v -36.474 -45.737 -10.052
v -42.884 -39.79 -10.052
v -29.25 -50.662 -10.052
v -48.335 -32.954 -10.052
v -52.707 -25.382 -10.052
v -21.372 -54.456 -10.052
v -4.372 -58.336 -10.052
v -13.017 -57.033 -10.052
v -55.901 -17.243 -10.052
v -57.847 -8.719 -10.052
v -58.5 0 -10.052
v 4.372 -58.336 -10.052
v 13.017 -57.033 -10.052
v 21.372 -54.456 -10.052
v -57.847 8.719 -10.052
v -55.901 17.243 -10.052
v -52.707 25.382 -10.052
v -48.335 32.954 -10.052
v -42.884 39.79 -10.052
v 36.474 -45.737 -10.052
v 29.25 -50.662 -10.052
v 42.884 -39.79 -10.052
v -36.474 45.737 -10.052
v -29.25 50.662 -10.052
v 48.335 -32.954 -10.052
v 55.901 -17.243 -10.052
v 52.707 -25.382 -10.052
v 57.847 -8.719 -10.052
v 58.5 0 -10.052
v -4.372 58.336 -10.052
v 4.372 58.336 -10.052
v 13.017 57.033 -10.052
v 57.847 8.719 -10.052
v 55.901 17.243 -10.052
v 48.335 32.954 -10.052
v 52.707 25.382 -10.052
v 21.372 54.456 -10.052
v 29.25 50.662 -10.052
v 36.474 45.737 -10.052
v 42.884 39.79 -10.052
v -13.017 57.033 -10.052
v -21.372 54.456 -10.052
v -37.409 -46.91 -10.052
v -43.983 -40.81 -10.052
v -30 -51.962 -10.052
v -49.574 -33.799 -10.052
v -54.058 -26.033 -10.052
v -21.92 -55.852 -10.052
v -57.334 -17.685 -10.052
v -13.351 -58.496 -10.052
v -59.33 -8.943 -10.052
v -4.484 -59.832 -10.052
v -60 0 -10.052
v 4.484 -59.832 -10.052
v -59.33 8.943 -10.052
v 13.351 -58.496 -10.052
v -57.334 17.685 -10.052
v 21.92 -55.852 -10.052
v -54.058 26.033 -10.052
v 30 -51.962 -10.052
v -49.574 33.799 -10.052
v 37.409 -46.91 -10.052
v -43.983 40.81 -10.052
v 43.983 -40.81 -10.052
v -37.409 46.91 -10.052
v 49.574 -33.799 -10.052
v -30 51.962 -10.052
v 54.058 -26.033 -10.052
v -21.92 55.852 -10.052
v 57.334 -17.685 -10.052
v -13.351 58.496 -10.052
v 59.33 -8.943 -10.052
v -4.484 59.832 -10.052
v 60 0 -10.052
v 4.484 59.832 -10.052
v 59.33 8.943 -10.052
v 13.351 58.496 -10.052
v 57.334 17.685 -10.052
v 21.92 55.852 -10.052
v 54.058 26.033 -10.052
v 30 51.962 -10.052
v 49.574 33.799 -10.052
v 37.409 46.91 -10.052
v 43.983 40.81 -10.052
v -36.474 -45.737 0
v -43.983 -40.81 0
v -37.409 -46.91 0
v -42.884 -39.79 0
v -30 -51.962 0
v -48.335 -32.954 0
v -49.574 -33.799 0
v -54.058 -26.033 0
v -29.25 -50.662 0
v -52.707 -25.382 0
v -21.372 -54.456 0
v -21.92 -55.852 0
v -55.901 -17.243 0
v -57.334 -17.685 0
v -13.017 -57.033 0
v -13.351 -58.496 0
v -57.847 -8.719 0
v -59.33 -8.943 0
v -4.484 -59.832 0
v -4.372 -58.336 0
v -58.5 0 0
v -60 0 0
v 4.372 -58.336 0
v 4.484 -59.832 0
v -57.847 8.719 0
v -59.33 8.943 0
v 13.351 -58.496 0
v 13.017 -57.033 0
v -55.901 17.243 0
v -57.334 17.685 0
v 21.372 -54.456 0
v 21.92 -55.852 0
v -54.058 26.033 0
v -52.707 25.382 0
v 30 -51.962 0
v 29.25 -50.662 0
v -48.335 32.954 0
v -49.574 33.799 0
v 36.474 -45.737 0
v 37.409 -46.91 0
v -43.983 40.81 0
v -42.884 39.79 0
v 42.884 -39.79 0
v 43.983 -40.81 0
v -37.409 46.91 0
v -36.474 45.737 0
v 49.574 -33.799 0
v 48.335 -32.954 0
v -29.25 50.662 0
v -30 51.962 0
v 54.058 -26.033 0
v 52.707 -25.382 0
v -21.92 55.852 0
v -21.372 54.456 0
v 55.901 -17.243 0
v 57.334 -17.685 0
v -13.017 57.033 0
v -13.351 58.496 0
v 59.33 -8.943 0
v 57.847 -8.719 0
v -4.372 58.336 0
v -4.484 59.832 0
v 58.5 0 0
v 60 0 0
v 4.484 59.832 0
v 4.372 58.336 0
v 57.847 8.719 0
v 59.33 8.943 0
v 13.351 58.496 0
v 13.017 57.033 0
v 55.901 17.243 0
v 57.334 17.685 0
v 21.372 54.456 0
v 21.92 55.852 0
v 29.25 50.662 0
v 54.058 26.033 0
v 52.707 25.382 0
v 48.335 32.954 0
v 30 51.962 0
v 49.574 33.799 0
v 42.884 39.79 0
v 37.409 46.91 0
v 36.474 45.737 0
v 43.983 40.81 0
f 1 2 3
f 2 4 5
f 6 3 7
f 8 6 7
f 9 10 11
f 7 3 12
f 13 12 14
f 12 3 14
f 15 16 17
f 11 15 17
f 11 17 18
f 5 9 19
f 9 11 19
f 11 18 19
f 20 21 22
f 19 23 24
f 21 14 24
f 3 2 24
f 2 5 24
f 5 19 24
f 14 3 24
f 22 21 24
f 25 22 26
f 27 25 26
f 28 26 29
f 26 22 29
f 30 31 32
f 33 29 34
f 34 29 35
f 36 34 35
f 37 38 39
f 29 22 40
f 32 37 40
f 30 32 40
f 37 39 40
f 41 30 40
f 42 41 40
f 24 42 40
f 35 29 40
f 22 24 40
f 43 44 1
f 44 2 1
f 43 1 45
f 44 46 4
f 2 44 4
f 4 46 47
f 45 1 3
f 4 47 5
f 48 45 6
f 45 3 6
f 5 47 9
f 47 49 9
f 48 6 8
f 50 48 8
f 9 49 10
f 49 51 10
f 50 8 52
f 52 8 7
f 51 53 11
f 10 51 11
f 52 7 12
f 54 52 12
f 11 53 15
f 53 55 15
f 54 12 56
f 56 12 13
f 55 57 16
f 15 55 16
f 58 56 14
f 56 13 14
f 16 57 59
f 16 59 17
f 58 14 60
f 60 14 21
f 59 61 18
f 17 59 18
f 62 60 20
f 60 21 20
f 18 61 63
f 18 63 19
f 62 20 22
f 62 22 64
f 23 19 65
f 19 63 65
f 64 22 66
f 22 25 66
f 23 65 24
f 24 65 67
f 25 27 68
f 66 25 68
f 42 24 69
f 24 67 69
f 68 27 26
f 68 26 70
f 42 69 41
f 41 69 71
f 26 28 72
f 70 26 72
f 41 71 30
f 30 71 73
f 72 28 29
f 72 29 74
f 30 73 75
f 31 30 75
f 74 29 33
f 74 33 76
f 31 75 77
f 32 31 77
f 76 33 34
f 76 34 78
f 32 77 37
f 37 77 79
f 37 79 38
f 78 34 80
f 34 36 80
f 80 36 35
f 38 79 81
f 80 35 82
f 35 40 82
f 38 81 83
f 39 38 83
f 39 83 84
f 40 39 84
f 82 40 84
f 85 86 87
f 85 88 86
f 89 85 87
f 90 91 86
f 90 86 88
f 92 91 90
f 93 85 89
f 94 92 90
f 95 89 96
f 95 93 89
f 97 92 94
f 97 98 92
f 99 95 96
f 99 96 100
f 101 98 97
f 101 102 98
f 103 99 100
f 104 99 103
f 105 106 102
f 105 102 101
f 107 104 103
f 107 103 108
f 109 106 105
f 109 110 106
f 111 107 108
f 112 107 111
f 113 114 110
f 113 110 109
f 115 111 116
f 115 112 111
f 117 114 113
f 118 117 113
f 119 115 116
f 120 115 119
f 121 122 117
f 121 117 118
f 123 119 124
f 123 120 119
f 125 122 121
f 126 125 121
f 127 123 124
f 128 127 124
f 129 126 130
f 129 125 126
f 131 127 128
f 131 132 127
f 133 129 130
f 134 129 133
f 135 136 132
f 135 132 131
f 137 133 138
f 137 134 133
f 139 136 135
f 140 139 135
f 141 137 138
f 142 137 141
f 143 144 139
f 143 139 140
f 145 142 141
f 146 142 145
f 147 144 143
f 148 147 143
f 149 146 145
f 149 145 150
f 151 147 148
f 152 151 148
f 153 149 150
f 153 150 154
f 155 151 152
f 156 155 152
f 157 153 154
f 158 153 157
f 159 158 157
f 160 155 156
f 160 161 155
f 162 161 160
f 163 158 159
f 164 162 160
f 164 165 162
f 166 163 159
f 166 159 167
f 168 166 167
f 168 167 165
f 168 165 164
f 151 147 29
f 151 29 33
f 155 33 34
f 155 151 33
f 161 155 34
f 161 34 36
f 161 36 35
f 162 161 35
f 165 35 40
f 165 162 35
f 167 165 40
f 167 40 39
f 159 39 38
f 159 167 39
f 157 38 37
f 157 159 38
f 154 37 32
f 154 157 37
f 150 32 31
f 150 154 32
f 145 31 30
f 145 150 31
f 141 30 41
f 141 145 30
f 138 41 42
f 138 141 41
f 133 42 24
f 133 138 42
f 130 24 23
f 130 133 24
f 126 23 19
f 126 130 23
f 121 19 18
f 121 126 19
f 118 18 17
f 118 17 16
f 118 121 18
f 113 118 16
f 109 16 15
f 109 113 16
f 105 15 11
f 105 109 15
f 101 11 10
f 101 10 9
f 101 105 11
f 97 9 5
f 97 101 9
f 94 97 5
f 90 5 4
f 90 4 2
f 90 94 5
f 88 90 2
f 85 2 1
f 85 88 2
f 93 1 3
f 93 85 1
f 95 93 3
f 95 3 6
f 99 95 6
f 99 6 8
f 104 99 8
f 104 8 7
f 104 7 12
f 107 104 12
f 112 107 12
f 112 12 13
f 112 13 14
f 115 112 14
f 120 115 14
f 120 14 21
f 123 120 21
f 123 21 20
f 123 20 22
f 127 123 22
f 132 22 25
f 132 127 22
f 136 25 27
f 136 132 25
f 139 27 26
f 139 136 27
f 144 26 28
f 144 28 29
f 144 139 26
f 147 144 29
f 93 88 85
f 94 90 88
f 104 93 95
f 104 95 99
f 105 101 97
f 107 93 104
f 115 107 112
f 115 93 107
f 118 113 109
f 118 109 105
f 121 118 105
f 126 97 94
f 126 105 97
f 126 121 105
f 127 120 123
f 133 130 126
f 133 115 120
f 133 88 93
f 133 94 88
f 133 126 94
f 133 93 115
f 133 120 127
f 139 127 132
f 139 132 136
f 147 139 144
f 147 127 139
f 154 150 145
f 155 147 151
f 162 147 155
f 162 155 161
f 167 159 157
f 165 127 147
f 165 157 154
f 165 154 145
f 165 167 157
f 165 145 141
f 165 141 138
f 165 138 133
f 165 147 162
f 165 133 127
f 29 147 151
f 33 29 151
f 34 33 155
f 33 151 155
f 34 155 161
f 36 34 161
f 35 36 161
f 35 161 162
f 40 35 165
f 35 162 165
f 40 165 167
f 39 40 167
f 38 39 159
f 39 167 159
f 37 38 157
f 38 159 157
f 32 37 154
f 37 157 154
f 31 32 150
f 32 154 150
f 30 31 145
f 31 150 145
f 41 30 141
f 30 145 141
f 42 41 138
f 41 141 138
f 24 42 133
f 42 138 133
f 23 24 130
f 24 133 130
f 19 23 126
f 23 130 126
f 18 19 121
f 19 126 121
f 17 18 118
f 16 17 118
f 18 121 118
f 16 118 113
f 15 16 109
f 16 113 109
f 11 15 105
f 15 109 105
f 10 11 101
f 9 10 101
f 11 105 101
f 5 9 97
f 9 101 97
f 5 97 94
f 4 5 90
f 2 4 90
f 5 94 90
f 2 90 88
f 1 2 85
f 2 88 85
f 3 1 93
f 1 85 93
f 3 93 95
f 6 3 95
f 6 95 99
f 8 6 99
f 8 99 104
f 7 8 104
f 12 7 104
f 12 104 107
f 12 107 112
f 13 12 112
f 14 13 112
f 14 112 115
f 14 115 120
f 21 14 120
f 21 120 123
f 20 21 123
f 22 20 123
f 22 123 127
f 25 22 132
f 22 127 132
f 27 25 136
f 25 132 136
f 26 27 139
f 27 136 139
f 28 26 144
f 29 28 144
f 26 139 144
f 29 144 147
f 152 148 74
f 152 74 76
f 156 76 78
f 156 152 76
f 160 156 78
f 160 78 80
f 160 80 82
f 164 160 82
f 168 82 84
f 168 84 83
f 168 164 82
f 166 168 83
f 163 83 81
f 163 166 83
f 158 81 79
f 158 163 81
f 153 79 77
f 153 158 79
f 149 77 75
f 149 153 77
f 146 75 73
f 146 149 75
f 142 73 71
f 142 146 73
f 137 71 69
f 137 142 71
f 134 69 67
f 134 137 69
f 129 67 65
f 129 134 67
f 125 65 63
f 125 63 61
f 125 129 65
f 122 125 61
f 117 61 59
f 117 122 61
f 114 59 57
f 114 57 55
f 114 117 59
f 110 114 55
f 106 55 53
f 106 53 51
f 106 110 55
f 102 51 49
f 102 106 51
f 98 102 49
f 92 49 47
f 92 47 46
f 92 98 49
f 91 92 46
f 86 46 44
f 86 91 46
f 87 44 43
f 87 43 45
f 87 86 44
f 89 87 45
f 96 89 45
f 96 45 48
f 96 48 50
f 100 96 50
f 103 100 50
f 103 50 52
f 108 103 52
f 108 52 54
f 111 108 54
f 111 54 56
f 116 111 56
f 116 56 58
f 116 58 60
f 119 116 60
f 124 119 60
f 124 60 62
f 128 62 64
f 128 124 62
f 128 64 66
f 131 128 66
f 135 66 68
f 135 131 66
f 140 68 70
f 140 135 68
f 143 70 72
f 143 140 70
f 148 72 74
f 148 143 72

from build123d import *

# Parameters (mm, degrees)
F0_R     = 60
F0_R_2   = 58.5
F2_DEPTH = 10.052125901
F1_R     = 58.5


with BuildPart() as f2:
    # F0 (on Top) → F2 (new body)
    with BuildSketch(Plane.XY):
        Circle(F0_R)
        Circle(F0_R_2, mode=Mode.SUBTRACT)
    extrude(amount=-F2_DEPTH)


with BuildPart() as f2b:
    # F1 (on face) → F2, piece 2 (new body)
    with BuildSketch(Plane.XY):
        Circle(F1_R)
    extrude(amount=-F2_DEPTH)


solid = Compound([f2.part, f2b.part])
